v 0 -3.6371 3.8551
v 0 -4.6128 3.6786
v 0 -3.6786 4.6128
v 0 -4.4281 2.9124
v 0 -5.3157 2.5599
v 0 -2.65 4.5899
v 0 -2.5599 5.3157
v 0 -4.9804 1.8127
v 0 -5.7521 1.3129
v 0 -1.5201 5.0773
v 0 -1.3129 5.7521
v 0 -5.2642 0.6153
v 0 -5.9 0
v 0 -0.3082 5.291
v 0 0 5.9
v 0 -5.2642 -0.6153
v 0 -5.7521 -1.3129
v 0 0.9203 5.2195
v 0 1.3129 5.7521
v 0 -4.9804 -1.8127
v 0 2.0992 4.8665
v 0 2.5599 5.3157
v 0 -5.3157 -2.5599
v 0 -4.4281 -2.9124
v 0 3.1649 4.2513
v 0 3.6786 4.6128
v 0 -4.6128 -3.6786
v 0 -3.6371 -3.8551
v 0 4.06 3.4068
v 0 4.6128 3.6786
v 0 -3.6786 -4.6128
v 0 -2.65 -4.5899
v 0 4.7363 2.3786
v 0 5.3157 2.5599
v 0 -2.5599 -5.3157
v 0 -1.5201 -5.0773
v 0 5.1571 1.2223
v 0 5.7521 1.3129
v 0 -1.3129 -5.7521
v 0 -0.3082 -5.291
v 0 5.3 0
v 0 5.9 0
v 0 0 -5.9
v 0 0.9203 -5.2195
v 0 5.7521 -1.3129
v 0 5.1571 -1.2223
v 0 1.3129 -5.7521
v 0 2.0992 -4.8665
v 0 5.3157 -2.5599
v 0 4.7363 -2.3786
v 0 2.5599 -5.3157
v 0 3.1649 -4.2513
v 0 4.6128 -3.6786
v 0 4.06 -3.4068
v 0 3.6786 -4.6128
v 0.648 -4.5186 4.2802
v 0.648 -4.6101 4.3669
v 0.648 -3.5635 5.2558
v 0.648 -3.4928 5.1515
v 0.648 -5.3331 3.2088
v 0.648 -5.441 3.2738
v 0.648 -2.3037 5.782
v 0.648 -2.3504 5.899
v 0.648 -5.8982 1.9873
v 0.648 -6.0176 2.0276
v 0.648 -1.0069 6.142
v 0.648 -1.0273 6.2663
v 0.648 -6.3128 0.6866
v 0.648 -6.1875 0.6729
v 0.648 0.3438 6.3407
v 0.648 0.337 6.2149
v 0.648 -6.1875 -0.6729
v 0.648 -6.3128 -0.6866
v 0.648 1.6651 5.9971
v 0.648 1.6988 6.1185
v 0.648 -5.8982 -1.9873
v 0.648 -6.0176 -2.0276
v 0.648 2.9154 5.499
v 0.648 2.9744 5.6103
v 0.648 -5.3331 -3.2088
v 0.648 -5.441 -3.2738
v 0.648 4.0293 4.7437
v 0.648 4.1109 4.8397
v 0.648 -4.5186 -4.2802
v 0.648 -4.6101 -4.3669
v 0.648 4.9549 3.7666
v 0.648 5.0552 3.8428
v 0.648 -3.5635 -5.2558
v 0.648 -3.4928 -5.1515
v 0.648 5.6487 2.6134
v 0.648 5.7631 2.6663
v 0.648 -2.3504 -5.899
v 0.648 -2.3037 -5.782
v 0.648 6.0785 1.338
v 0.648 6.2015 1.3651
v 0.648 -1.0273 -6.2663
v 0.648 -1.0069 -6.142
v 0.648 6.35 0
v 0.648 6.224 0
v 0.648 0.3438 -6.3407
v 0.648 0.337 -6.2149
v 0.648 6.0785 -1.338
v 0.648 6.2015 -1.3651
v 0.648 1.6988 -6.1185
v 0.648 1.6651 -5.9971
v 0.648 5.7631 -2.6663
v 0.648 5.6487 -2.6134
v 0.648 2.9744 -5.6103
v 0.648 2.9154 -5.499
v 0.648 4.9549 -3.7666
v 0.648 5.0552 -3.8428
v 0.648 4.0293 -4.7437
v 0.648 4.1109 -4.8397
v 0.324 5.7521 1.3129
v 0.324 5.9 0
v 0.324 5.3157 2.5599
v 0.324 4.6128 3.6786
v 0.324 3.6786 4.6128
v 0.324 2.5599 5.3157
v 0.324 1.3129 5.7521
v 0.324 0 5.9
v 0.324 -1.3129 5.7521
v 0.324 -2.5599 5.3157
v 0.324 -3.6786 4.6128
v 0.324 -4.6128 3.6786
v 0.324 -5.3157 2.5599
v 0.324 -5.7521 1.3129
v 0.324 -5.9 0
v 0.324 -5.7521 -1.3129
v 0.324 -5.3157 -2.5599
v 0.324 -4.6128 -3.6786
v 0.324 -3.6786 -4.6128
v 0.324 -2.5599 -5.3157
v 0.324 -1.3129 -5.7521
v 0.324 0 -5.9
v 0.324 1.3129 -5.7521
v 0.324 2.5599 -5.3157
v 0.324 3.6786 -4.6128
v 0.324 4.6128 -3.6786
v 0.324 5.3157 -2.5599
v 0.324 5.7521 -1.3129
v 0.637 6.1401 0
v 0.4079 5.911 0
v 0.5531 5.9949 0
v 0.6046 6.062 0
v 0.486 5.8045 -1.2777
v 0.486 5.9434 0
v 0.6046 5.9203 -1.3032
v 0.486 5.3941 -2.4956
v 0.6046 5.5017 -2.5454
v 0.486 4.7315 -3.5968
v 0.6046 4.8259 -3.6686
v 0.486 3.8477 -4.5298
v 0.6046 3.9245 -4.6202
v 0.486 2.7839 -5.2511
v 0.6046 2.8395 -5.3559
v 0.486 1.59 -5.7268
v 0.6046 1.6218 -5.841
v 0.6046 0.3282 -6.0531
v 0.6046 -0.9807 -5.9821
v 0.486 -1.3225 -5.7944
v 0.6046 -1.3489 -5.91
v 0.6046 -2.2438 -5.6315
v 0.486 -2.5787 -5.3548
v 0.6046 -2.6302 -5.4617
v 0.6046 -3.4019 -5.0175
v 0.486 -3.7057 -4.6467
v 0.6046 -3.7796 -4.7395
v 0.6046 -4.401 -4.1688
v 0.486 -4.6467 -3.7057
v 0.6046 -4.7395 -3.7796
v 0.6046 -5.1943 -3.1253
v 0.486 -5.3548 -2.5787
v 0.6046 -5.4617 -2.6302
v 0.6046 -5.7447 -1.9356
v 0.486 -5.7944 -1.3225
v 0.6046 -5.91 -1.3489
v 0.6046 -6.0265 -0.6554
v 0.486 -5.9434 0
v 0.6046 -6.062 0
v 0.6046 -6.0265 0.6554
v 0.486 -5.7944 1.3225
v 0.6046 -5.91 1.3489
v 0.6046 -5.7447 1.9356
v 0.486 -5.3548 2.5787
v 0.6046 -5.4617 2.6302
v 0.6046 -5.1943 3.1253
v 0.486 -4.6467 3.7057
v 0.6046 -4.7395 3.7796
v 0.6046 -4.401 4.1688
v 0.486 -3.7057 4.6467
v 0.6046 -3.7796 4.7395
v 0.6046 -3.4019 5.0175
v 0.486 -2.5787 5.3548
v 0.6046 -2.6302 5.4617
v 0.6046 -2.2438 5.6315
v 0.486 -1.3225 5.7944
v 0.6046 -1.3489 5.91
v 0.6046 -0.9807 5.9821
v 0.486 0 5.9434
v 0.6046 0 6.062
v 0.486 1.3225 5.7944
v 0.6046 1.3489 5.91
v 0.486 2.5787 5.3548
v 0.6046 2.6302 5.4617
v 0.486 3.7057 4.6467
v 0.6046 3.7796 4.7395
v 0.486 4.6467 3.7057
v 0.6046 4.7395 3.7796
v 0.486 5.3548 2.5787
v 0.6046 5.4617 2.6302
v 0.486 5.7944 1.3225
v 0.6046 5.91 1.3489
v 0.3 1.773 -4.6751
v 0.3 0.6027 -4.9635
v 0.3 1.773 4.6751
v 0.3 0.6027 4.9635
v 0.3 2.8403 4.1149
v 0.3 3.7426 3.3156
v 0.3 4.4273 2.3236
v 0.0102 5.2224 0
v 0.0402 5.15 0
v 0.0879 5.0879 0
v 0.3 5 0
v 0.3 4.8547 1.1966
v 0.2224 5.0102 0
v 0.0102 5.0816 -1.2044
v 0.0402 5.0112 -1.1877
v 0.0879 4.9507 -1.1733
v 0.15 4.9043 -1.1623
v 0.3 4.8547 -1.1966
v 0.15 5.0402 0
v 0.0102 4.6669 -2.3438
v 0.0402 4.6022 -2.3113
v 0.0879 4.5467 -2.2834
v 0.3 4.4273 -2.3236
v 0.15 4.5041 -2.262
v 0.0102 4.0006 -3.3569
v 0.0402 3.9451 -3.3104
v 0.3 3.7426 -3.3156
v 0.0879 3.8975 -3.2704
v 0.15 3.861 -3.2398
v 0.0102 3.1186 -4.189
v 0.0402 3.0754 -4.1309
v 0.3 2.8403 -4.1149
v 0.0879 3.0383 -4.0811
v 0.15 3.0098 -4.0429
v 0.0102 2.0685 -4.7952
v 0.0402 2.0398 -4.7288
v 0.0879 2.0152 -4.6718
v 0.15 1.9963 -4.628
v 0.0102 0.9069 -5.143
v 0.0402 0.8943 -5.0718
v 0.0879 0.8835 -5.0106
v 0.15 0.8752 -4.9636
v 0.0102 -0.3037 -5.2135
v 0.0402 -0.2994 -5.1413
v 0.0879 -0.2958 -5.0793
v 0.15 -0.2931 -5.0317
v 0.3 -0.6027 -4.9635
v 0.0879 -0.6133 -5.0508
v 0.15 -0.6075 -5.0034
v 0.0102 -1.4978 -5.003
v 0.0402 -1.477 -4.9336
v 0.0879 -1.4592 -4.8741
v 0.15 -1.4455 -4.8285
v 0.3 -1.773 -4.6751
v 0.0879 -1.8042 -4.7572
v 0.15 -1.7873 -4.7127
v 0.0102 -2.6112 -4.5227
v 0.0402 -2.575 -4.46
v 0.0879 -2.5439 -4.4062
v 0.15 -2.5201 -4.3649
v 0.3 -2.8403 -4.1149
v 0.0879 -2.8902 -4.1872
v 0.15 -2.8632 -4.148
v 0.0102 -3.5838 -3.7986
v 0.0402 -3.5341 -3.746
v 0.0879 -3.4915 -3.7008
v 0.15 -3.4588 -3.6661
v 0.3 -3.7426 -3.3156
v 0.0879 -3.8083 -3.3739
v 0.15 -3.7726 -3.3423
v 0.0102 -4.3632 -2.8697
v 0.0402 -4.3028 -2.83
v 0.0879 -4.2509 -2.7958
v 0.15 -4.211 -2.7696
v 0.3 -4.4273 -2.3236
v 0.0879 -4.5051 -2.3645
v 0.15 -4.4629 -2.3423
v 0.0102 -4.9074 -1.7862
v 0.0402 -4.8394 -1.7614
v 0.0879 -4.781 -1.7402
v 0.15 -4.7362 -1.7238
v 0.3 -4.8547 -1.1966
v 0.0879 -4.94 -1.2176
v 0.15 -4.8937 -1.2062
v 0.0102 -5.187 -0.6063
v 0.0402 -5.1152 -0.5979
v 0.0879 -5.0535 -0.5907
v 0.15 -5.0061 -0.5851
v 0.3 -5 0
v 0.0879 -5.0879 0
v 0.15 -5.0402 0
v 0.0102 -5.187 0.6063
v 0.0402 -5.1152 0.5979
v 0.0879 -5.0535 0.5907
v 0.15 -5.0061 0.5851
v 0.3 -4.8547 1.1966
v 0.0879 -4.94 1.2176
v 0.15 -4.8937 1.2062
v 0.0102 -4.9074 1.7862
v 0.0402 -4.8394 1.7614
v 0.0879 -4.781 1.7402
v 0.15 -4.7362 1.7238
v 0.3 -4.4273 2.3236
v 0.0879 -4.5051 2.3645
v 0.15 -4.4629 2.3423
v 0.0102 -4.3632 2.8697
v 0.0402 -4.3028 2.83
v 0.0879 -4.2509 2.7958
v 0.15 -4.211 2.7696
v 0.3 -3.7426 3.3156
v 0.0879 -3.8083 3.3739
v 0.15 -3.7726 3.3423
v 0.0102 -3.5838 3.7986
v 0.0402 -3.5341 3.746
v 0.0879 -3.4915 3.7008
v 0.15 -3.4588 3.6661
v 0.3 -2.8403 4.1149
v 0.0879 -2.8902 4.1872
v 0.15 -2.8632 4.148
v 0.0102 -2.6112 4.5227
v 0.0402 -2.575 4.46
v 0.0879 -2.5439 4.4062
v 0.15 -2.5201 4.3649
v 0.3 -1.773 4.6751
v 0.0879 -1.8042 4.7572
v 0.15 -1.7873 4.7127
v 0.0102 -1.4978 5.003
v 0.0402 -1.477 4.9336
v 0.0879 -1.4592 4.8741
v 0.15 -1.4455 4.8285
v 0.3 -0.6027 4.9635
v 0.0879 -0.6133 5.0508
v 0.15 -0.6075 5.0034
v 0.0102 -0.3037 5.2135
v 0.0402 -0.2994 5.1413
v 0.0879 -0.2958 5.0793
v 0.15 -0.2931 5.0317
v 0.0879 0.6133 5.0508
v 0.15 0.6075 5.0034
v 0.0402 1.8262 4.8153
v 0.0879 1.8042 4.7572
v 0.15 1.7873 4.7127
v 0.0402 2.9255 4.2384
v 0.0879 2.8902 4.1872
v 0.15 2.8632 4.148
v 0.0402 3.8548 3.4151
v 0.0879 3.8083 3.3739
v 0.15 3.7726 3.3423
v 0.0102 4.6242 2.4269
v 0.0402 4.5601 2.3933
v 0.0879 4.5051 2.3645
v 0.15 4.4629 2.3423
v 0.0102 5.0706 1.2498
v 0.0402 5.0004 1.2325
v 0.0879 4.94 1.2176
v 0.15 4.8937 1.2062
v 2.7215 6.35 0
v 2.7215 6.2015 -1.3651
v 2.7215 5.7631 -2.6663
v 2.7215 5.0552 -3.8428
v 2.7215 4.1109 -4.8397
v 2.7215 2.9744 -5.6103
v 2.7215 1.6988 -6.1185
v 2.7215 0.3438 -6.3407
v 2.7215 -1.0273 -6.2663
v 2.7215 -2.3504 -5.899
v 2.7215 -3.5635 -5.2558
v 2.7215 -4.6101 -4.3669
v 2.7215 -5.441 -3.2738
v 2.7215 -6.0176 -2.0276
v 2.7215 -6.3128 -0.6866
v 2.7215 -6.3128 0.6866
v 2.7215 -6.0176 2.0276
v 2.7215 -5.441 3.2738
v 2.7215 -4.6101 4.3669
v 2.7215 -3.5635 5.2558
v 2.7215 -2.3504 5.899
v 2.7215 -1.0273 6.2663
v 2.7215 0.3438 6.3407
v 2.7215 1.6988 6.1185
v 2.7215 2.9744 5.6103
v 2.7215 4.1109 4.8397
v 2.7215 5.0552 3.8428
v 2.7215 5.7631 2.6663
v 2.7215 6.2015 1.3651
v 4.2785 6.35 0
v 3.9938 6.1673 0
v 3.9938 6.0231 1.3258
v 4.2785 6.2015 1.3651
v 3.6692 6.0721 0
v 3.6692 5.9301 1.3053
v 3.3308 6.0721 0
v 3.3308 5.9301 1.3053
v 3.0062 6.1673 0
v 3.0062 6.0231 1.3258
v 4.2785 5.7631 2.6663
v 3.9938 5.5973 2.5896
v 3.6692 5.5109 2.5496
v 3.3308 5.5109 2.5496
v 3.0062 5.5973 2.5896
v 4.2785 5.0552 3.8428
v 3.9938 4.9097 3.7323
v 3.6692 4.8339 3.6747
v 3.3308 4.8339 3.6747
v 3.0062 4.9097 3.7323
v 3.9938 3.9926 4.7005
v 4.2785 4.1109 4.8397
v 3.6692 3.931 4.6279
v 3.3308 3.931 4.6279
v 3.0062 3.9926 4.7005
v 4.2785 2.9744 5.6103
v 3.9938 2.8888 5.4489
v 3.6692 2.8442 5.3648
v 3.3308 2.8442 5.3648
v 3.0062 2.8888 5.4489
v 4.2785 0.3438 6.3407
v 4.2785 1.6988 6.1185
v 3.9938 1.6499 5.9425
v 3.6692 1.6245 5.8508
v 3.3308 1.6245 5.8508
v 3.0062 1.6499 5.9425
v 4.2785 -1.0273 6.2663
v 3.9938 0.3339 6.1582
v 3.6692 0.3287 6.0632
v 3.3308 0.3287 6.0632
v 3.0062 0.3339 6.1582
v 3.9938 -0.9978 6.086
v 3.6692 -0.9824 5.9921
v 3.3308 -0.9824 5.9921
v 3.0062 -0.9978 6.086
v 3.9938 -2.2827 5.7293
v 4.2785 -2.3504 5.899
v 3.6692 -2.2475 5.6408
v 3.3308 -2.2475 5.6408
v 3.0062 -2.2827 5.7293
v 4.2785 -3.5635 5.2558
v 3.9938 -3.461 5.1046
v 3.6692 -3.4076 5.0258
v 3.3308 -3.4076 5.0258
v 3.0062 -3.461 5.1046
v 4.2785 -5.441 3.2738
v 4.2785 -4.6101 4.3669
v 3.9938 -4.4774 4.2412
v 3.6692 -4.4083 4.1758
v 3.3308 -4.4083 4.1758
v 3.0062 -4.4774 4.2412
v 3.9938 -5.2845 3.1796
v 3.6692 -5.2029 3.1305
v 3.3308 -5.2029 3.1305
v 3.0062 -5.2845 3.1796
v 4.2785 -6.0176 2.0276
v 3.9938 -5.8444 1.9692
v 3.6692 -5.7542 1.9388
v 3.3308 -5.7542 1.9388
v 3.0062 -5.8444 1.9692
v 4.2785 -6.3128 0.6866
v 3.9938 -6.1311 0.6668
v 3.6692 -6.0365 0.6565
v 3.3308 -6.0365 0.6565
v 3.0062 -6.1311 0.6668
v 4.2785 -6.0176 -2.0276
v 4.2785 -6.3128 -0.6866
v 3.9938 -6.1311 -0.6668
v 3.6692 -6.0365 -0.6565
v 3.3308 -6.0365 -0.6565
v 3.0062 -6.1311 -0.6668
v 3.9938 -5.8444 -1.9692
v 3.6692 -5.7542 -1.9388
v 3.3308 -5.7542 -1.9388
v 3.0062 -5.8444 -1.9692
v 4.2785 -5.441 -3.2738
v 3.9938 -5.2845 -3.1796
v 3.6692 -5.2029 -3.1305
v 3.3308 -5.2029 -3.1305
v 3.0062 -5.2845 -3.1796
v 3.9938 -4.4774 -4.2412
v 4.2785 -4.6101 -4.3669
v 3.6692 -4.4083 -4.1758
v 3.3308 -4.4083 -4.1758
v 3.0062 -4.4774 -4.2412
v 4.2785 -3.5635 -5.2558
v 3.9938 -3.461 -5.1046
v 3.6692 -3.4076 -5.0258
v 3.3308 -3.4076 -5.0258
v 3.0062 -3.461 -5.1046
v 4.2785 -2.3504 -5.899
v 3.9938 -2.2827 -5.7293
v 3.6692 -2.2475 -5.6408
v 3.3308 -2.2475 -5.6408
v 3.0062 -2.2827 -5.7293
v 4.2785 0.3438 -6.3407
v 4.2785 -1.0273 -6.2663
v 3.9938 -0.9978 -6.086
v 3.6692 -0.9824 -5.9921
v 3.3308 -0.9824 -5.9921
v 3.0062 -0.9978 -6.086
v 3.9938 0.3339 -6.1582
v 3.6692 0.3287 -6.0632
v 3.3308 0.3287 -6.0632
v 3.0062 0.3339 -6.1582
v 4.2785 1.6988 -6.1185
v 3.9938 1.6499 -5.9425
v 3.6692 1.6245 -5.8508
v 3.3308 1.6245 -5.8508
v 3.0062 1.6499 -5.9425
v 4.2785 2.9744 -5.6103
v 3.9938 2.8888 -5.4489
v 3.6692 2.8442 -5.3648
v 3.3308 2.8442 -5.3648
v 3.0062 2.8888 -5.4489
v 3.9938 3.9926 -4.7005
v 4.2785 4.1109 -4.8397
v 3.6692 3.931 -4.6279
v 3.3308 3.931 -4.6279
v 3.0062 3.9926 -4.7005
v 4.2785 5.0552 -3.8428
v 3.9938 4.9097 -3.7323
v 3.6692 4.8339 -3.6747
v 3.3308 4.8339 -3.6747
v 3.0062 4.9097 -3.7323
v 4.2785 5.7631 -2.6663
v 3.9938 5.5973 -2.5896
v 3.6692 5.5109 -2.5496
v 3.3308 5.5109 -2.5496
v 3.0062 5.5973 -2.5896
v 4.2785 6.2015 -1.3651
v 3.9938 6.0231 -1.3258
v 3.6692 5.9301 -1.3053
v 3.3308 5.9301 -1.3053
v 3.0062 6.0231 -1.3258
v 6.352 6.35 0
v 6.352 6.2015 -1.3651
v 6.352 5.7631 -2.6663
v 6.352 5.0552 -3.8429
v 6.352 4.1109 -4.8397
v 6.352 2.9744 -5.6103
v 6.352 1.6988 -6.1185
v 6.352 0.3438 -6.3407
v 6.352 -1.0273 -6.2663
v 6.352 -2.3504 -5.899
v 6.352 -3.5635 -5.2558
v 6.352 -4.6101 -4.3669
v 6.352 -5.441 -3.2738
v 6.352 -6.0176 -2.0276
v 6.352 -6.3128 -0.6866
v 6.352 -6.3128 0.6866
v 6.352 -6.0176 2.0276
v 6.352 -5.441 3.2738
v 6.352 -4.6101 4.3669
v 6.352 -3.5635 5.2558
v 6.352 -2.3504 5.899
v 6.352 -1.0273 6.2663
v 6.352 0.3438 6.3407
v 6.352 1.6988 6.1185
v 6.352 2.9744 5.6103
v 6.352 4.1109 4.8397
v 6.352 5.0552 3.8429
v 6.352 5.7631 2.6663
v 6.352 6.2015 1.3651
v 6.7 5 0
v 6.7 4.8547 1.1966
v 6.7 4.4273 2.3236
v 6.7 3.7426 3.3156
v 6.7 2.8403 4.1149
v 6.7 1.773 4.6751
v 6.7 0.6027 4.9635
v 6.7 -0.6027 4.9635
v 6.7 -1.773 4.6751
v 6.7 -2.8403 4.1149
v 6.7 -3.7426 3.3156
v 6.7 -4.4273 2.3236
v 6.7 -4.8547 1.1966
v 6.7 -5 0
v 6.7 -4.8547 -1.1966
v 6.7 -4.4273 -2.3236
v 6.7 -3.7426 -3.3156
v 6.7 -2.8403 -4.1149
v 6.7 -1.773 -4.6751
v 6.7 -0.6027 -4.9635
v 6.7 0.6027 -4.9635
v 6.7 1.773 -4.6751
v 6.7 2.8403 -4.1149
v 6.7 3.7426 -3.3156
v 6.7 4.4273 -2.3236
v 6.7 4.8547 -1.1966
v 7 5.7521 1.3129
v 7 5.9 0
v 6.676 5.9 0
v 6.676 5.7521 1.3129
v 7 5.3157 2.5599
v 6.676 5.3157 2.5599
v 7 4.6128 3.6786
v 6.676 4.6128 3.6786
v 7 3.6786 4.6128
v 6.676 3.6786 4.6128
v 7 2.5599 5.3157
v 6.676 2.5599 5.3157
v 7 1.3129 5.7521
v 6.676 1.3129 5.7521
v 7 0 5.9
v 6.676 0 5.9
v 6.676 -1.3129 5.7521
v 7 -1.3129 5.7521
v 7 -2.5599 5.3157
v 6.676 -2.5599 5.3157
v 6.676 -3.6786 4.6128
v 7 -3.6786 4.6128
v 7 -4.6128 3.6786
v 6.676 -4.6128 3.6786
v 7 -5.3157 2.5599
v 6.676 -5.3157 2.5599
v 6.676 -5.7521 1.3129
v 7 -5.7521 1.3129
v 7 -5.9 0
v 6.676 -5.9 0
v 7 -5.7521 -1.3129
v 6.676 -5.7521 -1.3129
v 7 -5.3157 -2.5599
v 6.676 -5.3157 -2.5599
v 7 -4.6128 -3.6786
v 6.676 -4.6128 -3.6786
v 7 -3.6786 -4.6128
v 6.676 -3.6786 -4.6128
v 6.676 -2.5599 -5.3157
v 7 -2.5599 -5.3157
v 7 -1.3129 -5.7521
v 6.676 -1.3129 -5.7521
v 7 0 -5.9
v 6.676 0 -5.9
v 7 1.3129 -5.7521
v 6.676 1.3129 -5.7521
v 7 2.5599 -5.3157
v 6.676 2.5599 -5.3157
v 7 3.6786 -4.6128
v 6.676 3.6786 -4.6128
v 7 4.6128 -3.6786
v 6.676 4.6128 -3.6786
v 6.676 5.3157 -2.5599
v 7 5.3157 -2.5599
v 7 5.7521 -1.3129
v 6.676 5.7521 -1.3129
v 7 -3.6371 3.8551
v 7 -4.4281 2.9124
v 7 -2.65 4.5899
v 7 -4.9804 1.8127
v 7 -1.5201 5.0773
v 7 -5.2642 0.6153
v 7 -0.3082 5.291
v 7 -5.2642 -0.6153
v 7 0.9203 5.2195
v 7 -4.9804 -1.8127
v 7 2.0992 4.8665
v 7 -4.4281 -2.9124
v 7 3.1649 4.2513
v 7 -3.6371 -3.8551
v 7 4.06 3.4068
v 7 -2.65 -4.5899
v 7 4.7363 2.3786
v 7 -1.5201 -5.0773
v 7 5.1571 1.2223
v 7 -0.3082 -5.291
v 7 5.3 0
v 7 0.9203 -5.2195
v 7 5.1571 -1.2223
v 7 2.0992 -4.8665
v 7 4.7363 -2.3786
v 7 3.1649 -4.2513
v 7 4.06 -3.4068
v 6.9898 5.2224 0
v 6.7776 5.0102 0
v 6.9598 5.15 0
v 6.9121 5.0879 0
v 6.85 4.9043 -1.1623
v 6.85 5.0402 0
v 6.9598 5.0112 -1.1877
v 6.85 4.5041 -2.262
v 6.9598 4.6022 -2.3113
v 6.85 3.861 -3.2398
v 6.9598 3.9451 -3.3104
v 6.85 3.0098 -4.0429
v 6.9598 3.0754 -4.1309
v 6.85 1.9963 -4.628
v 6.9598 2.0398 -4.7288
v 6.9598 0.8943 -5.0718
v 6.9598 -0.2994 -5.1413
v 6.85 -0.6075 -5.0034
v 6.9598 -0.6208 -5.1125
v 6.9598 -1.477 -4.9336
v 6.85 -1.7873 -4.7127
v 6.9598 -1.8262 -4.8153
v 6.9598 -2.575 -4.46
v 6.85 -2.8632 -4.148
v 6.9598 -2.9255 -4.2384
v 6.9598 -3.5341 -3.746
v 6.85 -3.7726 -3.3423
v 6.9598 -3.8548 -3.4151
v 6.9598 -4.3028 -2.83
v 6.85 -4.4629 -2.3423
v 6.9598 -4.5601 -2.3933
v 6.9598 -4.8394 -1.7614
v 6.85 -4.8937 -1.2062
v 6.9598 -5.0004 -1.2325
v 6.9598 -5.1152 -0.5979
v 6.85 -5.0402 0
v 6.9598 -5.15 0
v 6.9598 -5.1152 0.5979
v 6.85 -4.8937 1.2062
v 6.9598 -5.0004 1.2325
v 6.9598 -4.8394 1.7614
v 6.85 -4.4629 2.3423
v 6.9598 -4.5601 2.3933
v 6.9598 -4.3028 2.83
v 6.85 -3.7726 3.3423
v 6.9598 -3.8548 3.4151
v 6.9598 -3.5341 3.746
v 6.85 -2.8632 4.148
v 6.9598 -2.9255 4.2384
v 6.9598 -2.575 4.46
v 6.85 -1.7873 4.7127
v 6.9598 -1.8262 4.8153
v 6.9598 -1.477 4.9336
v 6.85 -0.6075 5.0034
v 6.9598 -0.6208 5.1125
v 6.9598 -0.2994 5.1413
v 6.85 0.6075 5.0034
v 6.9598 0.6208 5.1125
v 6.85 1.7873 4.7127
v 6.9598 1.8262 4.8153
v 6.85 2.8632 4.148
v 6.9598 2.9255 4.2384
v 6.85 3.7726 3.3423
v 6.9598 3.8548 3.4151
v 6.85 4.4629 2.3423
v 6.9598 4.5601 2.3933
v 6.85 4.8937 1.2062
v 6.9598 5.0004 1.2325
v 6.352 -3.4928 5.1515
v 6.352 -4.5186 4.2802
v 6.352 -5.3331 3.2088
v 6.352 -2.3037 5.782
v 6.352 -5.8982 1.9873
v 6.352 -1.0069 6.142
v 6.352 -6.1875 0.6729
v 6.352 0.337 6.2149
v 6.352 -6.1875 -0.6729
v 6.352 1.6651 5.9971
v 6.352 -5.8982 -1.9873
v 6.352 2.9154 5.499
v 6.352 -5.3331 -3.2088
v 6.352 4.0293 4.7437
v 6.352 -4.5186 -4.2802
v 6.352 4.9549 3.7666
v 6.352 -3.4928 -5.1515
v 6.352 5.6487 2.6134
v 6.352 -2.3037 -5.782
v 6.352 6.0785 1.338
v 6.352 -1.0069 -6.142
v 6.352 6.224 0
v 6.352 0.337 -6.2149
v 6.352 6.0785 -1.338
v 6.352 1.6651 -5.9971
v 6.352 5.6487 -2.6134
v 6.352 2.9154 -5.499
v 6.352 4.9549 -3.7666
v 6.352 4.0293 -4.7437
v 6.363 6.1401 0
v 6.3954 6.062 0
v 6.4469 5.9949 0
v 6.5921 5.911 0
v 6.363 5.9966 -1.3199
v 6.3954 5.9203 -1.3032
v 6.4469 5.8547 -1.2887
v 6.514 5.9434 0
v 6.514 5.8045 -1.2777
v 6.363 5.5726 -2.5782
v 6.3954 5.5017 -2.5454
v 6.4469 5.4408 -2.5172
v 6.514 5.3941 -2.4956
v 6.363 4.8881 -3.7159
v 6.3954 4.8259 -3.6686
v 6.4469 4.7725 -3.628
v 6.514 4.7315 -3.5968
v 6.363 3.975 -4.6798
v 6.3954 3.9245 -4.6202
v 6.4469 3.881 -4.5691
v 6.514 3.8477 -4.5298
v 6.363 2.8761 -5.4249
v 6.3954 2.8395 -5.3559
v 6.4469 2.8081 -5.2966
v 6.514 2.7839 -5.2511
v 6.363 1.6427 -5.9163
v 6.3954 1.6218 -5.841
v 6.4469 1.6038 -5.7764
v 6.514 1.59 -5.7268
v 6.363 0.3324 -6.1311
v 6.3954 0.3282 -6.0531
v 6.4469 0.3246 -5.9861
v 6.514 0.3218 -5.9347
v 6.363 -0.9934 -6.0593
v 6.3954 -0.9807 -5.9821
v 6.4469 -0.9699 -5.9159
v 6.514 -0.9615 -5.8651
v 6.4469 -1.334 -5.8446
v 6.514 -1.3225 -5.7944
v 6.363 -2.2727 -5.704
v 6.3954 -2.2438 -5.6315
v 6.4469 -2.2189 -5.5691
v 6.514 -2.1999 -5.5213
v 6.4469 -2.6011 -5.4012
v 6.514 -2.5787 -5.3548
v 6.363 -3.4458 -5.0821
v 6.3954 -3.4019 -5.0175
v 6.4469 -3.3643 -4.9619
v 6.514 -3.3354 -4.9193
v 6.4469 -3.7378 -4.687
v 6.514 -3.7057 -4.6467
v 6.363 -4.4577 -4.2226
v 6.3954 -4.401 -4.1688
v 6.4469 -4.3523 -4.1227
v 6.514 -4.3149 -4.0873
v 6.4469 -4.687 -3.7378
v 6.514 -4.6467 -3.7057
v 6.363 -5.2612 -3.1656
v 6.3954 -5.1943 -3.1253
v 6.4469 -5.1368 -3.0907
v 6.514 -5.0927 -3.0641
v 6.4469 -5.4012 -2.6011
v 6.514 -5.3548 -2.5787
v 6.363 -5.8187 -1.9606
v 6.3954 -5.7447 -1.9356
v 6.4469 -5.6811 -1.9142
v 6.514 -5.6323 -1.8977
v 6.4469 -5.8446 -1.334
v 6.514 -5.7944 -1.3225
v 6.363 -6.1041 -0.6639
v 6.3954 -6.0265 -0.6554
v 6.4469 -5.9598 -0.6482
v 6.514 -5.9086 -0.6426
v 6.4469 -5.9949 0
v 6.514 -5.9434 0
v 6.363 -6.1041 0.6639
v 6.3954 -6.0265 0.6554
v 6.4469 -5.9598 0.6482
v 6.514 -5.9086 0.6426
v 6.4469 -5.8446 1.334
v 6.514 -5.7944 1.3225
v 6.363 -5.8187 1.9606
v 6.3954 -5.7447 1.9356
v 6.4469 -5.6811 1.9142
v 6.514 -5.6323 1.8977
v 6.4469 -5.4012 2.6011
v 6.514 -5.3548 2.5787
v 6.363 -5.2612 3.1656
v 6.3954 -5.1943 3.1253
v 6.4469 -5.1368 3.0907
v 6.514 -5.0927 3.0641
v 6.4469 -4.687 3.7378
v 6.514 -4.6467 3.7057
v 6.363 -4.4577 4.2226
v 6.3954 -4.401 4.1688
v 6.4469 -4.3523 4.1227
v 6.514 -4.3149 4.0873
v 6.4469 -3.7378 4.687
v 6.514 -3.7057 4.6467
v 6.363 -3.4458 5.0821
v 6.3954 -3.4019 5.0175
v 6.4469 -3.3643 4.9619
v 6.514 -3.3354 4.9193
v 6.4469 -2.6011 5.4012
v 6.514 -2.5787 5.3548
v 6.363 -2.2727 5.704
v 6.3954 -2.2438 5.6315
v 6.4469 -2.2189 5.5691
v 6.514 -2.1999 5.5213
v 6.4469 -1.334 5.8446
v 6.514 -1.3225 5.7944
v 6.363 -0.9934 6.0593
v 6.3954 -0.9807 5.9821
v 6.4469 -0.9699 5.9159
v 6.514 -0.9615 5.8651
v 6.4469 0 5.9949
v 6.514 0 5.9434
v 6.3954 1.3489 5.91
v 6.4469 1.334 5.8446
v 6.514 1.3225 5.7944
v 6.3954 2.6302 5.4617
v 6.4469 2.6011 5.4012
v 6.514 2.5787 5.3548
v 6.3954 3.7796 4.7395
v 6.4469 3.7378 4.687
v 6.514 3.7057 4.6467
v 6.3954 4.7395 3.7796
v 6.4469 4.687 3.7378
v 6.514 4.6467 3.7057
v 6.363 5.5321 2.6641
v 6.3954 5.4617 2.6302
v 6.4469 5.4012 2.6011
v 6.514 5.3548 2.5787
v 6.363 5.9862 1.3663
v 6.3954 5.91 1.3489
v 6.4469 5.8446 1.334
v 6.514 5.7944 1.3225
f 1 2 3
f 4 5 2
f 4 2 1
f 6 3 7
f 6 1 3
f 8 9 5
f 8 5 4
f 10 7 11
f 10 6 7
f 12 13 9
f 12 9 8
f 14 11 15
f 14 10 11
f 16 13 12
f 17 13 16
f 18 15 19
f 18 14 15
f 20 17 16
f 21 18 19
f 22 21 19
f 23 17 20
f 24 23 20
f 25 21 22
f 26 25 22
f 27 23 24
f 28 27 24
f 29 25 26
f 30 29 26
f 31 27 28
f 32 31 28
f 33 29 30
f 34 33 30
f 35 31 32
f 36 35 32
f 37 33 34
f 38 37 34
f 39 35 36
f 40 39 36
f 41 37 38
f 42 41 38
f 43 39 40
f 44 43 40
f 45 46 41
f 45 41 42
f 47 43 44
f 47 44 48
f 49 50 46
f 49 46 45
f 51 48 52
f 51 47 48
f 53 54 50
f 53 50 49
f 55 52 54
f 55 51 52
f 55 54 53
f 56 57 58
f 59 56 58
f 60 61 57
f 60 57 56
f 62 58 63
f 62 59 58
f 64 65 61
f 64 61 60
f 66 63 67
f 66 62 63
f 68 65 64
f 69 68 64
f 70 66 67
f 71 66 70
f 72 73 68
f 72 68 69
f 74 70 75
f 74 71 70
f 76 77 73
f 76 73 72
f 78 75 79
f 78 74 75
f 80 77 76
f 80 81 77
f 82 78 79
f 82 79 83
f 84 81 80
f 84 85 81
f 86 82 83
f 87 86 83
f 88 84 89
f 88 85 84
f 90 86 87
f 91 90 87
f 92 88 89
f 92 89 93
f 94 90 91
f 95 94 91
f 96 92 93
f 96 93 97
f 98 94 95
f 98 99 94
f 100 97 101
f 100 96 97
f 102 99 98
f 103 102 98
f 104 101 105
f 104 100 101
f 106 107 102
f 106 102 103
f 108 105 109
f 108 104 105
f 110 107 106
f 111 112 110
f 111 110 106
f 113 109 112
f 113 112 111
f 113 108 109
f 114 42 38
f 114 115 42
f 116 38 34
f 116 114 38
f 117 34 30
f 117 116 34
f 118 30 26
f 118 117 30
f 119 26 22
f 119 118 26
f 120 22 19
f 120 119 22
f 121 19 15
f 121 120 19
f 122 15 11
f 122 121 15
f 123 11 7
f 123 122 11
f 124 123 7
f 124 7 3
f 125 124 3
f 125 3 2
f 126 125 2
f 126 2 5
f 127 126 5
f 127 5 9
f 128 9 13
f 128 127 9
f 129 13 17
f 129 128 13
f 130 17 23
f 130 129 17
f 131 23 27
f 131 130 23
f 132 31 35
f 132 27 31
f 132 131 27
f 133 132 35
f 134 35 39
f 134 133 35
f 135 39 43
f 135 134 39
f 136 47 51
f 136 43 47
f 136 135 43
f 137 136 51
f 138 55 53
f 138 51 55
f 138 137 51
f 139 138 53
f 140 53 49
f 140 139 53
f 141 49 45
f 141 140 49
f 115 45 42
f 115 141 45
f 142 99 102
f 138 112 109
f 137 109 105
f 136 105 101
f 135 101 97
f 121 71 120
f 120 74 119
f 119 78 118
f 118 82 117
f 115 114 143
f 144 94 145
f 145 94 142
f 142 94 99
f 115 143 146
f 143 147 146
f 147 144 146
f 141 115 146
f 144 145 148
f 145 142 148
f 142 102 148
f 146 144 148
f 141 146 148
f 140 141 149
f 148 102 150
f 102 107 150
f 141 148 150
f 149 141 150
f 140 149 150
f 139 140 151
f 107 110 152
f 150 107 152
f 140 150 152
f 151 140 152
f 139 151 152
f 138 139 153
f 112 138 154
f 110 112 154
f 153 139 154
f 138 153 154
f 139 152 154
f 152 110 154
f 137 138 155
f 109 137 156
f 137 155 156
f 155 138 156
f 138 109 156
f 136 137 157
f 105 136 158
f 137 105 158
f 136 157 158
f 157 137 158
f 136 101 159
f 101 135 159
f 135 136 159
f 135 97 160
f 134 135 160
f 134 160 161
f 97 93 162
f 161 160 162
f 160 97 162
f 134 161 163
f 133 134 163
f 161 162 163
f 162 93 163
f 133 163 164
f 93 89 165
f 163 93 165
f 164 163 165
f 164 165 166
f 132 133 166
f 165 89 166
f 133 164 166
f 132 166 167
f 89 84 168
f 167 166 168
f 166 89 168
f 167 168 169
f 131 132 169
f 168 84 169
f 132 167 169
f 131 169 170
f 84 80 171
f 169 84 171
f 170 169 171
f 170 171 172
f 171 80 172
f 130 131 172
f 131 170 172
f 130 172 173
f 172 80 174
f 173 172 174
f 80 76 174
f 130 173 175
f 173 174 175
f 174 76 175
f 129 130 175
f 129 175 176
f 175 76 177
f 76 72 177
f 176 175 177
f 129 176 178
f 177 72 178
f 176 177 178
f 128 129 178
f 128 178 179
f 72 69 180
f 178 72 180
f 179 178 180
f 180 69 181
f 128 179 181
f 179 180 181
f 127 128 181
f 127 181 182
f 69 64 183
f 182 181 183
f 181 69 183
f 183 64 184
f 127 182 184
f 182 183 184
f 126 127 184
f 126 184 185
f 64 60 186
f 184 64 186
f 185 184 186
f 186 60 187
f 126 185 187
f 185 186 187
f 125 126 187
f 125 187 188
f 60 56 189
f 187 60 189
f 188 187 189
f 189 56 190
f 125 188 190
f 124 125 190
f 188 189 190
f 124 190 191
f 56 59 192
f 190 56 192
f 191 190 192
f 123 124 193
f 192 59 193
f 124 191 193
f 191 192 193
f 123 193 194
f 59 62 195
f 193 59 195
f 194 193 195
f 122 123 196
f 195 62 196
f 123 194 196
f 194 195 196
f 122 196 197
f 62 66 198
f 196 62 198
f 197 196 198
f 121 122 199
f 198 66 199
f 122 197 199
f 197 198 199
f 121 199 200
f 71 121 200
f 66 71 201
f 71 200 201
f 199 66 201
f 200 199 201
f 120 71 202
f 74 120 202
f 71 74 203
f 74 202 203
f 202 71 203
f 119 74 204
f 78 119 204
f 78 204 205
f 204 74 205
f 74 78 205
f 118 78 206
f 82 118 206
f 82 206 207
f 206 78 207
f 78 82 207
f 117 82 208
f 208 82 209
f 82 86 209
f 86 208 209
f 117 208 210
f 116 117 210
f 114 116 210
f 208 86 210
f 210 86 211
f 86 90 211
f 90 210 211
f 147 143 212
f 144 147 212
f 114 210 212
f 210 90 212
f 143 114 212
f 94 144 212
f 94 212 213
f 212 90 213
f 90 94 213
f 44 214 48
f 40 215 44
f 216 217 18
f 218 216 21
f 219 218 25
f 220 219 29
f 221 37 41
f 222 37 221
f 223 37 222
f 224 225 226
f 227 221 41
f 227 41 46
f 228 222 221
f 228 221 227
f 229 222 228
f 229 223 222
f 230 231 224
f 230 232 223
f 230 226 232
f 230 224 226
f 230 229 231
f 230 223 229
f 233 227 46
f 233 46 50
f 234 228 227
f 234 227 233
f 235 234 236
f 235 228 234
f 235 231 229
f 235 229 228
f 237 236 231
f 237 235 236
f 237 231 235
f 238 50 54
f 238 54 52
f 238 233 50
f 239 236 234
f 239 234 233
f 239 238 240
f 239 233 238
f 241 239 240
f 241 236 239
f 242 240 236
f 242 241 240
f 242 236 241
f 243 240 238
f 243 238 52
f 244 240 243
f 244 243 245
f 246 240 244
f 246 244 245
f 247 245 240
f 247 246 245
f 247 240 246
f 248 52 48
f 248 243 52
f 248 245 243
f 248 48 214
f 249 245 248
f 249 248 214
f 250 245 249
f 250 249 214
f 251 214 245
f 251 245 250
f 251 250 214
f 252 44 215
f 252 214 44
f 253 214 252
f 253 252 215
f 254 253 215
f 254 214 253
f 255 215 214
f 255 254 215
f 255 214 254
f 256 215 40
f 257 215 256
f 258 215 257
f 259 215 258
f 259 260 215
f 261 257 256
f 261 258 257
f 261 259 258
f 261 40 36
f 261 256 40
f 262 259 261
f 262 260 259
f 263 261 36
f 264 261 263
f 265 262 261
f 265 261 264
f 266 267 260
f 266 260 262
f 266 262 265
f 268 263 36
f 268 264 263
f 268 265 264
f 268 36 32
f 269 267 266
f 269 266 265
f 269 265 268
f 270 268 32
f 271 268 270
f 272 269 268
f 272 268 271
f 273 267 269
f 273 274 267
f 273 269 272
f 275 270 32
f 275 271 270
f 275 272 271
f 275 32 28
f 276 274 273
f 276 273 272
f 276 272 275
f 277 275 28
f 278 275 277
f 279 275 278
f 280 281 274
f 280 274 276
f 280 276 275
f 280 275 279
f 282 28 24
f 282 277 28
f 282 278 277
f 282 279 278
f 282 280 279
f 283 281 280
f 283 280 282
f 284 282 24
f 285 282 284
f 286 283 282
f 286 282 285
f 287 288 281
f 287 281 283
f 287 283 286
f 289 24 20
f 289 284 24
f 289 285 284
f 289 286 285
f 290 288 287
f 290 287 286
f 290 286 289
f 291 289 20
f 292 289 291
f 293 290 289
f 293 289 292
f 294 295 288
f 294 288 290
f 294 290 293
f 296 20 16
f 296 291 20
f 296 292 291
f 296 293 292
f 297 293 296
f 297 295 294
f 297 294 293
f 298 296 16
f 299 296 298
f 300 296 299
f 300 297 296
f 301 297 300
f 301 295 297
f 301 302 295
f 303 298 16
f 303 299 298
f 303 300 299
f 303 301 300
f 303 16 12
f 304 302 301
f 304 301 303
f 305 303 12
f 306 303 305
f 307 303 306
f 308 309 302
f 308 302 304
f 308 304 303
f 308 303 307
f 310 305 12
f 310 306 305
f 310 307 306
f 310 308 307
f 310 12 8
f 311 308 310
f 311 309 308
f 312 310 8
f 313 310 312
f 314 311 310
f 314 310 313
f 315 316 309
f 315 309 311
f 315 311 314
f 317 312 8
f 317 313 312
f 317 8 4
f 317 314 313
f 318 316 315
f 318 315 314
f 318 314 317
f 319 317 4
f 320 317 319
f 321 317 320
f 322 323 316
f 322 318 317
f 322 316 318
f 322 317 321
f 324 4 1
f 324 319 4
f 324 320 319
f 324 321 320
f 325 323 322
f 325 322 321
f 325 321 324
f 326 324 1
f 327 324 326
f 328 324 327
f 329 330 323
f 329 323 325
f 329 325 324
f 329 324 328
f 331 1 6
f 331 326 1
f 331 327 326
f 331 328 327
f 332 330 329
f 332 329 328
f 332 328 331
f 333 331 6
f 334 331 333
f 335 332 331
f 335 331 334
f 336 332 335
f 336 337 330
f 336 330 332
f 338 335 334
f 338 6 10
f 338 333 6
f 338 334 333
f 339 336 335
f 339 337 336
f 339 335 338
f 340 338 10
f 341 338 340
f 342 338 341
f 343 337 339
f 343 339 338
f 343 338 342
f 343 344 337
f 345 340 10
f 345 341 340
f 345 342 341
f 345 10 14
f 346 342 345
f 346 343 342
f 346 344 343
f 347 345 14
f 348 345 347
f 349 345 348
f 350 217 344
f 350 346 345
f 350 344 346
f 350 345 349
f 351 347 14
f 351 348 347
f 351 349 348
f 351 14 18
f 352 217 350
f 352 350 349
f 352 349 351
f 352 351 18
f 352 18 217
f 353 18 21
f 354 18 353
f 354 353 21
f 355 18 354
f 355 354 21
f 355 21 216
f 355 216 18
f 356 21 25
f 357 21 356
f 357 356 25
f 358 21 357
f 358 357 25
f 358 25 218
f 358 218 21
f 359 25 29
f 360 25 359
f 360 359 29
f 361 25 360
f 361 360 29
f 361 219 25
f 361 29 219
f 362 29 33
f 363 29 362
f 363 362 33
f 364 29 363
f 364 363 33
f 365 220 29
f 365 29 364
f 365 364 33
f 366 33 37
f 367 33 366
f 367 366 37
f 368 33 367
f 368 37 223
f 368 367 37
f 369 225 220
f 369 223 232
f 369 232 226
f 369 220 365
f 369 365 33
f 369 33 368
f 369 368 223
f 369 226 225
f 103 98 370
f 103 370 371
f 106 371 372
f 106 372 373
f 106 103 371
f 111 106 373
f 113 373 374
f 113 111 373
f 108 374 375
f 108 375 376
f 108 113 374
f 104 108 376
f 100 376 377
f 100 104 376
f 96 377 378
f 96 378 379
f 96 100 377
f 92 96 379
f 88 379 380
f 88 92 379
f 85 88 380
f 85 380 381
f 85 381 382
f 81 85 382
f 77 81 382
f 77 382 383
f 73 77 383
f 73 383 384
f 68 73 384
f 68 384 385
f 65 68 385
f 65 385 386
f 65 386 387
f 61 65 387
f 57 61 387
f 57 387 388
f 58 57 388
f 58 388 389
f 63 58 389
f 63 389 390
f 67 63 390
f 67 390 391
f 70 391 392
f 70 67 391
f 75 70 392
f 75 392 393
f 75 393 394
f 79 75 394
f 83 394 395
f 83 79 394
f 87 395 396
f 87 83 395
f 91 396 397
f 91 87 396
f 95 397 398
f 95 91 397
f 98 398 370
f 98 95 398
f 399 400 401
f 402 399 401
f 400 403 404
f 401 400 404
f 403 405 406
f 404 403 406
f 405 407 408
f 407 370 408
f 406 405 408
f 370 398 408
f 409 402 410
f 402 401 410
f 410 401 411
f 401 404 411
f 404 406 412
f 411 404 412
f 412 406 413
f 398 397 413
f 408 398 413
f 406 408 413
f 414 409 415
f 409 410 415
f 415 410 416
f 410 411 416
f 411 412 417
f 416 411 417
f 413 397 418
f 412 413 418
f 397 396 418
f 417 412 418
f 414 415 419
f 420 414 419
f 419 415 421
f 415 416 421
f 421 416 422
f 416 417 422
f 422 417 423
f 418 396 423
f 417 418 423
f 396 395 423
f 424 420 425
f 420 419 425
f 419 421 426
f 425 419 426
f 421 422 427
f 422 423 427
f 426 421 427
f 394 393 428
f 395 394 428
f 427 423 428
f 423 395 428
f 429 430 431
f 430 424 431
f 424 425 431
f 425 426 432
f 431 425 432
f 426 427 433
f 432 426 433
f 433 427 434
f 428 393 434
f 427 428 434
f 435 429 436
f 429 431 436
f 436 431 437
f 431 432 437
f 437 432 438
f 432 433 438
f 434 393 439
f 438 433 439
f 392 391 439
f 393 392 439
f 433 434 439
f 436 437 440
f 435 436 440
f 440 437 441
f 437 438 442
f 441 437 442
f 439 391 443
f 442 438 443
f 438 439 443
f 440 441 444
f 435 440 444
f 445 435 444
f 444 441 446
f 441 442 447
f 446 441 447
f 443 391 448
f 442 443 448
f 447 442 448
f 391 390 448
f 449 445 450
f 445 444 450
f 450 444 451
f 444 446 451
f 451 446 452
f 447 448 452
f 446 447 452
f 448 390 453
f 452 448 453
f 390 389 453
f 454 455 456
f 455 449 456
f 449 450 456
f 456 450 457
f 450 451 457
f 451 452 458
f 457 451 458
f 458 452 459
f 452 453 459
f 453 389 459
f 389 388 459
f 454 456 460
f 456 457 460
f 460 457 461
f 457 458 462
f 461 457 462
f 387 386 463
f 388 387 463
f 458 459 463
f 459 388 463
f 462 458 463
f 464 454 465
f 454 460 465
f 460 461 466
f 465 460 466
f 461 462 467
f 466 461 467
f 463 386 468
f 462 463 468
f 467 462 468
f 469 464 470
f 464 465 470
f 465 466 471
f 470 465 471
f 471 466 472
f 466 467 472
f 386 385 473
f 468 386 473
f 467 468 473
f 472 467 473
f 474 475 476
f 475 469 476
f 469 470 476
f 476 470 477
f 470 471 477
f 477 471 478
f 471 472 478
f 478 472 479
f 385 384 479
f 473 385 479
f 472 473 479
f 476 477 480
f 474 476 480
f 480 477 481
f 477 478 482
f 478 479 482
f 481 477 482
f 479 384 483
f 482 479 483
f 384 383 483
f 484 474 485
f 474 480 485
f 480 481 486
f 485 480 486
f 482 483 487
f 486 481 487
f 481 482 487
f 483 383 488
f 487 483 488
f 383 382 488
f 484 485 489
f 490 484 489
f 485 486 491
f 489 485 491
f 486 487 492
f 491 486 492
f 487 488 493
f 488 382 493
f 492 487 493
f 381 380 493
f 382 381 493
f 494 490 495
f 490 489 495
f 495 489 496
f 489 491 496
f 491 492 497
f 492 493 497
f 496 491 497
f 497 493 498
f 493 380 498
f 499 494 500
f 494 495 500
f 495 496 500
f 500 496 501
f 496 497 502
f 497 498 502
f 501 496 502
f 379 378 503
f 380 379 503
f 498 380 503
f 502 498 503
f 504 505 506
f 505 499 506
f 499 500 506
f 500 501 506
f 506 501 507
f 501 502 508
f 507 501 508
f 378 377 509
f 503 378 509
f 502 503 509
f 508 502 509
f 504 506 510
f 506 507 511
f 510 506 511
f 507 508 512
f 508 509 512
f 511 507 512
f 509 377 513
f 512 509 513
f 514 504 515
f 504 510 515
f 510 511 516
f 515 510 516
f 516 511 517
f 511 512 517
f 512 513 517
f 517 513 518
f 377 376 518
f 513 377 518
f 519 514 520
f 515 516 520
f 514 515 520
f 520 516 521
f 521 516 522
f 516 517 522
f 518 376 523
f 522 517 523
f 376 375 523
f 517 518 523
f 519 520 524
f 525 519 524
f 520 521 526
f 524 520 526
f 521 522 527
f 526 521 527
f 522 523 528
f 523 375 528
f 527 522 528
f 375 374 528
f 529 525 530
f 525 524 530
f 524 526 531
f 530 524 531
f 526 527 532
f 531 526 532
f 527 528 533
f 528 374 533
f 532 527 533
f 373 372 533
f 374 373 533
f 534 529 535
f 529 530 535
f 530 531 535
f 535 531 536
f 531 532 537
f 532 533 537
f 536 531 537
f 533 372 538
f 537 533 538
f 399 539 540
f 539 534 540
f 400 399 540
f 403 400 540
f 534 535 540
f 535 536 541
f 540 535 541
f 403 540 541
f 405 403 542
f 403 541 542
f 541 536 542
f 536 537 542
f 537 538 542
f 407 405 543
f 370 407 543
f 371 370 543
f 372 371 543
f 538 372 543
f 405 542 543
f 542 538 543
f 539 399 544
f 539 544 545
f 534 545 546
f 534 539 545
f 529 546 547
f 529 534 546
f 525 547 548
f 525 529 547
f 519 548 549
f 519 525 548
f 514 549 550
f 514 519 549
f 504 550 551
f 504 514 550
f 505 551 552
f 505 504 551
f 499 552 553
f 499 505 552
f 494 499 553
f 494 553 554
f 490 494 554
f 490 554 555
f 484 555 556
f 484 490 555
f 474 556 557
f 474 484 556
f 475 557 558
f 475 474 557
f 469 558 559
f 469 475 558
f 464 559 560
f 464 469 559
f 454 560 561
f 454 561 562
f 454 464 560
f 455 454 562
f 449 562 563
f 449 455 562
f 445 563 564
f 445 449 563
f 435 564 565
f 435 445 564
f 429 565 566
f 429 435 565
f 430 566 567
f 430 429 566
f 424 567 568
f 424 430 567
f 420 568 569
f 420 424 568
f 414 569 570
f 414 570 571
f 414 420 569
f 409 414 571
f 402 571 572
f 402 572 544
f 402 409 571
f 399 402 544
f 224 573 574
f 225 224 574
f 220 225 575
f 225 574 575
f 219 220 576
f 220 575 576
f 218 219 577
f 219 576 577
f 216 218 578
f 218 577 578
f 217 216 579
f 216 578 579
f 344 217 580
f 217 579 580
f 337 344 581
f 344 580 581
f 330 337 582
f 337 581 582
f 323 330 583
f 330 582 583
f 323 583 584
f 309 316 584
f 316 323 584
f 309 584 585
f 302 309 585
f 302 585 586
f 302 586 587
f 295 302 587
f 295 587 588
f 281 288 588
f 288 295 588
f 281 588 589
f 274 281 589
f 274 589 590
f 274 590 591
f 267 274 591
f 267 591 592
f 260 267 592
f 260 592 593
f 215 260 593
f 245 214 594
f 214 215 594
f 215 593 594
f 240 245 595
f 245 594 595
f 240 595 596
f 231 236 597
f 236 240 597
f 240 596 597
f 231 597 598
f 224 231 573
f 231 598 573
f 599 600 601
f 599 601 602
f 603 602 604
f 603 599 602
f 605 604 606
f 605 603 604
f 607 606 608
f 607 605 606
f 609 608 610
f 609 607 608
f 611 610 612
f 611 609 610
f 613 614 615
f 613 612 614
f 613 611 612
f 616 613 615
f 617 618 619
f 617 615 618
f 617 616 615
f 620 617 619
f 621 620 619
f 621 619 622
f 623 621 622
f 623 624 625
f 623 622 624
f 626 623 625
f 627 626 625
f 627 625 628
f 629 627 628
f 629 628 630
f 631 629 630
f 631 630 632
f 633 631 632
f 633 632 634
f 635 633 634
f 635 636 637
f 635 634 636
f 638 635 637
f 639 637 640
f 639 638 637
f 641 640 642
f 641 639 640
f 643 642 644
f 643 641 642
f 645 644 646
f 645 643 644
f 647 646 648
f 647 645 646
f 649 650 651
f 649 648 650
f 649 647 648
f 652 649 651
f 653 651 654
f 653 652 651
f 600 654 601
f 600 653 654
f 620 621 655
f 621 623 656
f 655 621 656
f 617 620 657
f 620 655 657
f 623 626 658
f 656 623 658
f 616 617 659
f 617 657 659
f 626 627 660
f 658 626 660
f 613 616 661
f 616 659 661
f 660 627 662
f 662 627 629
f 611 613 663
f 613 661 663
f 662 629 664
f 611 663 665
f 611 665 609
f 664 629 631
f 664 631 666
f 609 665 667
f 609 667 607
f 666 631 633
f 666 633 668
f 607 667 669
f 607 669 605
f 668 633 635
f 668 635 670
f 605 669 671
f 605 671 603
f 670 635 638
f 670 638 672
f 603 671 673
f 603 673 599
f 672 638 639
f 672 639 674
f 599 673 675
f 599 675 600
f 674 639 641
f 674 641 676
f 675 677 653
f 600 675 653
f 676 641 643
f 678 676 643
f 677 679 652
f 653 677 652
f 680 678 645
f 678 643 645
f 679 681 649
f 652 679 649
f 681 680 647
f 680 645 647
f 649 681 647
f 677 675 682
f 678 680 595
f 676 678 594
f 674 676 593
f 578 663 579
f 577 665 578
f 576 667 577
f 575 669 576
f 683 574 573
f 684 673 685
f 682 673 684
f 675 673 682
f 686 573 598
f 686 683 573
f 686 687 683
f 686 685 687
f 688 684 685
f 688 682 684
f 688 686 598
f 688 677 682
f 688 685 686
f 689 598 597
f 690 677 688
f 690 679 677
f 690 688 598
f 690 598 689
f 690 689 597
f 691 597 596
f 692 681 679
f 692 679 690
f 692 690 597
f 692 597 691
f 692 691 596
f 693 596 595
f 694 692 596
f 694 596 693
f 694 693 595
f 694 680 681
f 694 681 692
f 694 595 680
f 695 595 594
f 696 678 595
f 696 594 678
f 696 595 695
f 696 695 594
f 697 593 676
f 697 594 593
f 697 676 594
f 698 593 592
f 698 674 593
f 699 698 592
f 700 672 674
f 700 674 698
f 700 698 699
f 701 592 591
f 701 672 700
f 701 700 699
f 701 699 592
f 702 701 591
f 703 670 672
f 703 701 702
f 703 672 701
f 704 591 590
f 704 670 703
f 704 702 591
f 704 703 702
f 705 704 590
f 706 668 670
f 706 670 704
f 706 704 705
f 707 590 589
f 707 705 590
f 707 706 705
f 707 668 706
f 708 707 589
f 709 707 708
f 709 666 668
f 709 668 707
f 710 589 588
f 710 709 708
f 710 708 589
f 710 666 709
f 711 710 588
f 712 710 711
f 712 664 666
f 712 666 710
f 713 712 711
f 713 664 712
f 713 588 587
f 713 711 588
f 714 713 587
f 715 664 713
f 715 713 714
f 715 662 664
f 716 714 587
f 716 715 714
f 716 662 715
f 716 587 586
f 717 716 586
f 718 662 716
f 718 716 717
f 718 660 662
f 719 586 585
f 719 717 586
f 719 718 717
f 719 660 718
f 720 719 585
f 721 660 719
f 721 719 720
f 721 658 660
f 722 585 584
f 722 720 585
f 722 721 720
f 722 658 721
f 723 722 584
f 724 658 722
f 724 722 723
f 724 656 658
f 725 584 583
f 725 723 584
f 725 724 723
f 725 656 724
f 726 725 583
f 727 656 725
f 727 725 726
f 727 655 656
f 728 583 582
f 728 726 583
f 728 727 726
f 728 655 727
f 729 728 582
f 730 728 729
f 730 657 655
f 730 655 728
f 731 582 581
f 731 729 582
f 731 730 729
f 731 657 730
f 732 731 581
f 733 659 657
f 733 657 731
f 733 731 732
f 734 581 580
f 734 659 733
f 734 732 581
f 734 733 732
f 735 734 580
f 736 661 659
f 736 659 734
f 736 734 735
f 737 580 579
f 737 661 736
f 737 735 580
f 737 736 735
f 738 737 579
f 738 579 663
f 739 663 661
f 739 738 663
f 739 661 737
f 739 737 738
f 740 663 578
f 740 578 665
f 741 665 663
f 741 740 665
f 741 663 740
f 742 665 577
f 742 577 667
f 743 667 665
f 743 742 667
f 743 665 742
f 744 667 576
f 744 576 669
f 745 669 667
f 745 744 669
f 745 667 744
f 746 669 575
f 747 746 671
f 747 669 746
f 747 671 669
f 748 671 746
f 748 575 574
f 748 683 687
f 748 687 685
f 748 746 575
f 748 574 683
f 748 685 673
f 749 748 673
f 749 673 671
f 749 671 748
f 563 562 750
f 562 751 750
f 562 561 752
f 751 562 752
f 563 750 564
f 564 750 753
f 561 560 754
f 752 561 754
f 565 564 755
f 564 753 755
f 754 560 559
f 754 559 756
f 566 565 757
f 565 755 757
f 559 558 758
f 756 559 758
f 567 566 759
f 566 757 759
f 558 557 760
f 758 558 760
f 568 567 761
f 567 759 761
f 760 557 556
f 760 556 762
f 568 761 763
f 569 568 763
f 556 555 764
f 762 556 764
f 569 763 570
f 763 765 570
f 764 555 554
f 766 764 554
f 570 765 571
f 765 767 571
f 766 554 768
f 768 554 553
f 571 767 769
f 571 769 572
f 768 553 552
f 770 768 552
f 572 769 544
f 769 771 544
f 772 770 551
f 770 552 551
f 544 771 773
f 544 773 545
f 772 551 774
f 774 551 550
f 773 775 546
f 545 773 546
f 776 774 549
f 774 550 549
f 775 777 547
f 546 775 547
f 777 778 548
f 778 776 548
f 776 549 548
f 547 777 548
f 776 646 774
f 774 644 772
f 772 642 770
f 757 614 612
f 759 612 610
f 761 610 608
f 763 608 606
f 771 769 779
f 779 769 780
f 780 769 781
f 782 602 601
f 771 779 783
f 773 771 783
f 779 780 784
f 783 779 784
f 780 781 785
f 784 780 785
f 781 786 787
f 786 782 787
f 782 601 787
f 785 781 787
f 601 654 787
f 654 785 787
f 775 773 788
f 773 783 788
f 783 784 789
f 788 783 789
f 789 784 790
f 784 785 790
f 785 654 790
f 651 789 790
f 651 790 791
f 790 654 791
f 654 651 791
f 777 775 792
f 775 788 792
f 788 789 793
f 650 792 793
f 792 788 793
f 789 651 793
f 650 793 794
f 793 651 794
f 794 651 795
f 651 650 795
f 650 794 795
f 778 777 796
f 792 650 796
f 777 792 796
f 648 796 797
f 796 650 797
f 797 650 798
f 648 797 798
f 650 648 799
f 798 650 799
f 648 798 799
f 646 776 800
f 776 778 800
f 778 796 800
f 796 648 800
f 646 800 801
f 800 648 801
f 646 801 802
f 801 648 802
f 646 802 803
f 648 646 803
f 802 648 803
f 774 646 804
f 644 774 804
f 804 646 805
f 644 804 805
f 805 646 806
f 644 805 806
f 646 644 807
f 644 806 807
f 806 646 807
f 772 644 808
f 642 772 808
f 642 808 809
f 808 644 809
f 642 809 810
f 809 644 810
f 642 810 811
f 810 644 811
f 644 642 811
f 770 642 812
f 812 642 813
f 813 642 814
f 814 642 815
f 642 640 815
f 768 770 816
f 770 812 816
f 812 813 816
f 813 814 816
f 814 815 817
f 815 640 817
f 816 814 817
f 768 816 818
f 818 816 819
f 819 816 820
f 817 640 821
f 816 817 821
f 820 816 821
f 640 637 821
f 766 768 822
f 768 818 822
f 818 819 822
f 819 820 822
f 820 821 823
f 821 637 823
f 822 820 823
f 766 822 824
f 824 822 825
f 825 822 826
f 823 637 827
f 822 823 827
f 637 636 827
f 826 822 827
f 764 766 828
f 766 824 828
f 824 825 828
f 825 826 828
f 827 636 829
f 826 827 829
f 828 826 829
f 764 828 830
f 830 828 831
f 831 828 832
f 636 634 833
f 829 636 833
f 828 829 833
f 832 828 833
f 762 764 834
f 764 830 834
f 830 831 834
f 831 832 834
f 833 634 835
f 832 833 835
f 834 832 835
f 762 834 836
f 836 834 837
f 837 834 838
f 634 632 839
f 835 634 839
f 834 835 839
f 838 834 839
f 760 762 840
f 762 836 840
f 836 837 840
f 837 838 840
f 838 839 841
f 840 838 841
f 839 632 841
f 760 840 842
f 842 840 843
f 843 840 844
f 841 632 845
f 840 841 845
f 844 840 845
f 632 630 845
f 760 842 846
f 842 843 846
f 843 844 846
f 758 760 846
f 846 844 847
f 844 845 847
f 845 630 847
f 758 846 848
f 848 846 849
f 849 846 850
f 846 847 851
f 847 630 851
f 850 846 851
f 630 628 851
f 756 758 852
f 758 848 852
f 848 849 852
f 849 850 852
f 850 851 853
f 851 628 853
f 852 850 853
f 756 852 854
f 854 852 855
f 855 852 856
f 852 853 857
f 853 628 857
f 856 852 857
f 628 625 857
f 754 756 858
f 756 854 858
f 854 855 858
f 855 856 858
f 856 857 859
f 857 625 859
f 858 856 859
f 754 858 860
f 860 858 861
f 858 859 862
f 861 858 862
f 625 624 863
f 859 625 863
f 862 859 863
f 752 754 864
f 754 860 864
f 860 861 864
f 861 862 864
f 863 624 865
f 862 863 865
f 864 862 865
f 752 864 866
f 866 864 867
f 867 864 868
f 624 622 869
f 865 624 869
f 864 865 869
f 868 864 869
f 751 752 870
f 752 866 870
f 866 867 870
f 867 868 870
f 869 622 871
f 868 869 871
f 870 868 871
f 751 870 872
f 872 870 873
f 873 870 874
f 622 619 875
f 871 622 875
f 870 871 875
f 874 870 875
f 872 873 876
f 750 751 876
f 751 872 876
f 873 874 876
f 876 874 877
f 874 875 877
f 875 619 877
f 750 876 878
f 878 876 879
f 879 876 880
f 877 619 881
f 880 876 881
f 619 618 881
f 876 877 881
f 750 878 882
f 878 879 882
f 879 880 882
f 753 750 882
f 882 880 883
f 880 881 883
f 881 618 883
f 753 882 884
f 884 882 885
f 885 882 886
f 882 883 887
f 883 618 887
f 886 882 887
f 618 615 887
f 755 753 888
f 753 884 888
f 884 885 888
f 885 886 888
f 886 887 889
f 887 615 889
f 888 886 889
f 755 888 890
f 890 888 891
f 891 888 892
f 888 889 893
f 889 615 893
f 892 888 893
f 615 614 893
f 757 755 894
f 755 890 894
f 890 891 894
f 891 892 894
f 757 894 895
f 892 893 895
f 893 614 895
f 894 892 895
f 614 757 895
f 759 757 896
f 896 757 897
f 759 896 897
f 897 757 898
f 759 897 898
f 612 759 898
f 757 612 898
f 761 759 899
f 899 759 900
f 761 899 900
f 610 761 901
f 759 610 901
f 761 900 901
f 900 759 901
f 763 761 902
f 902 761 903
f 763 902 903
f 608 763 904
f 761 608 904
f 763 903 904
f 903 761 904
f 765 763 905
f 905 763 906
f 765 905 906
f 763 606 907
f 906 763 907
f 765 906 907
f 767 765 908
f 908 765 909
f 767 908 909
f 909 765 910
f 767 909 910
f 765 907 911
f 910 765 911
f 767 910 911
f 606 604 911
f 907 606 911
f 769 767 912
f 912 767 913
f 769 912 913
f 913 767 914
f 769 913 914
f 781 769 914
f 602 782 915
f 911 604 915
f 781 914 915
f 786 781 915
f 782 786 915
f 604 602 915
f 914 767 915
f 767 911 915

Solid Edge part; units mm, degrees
sketch "Sketch1" plane through (0, 0, 0) normal (0, 0, 1) x (1, 0, 0)
  arc A0 (0, 5.3) -> (0.3, 5) centre (0.3, 5.3) ccw
  line L0 (0.3, 5) -> (6.7, 5)
  arc A1 (6.7, 5) -> (7, 5.3) centre (6.7, 5.3) ccw
  line L1 (7, 5.3) -> (7, 6.25)
  arc A2 (7, 6.25) -> (6.9, 6.35) centre (6.9, 6.25) ccw
  line L2 (6.9, 6.35) -> (4.2785, 6.35)
  arc A3 (4.2785, 6.35) -> (2.7215, 6.35) centre (3.5, 7.25) cw
  line L3 (2.7215, 6.35) -> (0.1, 6.35)
  arc A4 (0.1, 6.35) -> (0, 6.25) centre (0.1, 6.25) ccw
  line L4 (0, 6.25) -> (0, 5.3)
revolve "RevolvedProtrusion1" add sketch "Sketch1" angle 360 about axis through (6.7, 0, 0) along (-1, 0, 0)
sketch "Sketch2" plane through (0, 0, 0) normal (0, 0, 1) x (1, 0, 0)
  line L0 (0, 5.9) -> (0.324, 5.9)
  arc A0 (0.324, 5.9) -> (0.648, 6.224) centre (0.324, 6.224) ccw
  line L1 (0.648, 6.224) -> (0.648, 6.8)
  line L2 (0.648, 6.8) -> (6.352, 6.8)
  line L3 (6.352, 6.8) -> (6.352, 6.224)
  arc A1 (6.352, 6.224) -> (6.676, 5.9) centre (6.676, 6.224) ccw
  line L4 (6.676, 5.9) -> (7, 5.9)
  line L5 (7, 5.9) -> (7, 7.25)
  line L6 (7, 7.25) -> (0, 7.25)
  line L7 (0, 7.25) -> (0, 5.9)
revolve "RevolvedCutout1" cut sketch "Sketch2" angle 360 about axis through (7, 0, 0) along (-1, 0, 0)
